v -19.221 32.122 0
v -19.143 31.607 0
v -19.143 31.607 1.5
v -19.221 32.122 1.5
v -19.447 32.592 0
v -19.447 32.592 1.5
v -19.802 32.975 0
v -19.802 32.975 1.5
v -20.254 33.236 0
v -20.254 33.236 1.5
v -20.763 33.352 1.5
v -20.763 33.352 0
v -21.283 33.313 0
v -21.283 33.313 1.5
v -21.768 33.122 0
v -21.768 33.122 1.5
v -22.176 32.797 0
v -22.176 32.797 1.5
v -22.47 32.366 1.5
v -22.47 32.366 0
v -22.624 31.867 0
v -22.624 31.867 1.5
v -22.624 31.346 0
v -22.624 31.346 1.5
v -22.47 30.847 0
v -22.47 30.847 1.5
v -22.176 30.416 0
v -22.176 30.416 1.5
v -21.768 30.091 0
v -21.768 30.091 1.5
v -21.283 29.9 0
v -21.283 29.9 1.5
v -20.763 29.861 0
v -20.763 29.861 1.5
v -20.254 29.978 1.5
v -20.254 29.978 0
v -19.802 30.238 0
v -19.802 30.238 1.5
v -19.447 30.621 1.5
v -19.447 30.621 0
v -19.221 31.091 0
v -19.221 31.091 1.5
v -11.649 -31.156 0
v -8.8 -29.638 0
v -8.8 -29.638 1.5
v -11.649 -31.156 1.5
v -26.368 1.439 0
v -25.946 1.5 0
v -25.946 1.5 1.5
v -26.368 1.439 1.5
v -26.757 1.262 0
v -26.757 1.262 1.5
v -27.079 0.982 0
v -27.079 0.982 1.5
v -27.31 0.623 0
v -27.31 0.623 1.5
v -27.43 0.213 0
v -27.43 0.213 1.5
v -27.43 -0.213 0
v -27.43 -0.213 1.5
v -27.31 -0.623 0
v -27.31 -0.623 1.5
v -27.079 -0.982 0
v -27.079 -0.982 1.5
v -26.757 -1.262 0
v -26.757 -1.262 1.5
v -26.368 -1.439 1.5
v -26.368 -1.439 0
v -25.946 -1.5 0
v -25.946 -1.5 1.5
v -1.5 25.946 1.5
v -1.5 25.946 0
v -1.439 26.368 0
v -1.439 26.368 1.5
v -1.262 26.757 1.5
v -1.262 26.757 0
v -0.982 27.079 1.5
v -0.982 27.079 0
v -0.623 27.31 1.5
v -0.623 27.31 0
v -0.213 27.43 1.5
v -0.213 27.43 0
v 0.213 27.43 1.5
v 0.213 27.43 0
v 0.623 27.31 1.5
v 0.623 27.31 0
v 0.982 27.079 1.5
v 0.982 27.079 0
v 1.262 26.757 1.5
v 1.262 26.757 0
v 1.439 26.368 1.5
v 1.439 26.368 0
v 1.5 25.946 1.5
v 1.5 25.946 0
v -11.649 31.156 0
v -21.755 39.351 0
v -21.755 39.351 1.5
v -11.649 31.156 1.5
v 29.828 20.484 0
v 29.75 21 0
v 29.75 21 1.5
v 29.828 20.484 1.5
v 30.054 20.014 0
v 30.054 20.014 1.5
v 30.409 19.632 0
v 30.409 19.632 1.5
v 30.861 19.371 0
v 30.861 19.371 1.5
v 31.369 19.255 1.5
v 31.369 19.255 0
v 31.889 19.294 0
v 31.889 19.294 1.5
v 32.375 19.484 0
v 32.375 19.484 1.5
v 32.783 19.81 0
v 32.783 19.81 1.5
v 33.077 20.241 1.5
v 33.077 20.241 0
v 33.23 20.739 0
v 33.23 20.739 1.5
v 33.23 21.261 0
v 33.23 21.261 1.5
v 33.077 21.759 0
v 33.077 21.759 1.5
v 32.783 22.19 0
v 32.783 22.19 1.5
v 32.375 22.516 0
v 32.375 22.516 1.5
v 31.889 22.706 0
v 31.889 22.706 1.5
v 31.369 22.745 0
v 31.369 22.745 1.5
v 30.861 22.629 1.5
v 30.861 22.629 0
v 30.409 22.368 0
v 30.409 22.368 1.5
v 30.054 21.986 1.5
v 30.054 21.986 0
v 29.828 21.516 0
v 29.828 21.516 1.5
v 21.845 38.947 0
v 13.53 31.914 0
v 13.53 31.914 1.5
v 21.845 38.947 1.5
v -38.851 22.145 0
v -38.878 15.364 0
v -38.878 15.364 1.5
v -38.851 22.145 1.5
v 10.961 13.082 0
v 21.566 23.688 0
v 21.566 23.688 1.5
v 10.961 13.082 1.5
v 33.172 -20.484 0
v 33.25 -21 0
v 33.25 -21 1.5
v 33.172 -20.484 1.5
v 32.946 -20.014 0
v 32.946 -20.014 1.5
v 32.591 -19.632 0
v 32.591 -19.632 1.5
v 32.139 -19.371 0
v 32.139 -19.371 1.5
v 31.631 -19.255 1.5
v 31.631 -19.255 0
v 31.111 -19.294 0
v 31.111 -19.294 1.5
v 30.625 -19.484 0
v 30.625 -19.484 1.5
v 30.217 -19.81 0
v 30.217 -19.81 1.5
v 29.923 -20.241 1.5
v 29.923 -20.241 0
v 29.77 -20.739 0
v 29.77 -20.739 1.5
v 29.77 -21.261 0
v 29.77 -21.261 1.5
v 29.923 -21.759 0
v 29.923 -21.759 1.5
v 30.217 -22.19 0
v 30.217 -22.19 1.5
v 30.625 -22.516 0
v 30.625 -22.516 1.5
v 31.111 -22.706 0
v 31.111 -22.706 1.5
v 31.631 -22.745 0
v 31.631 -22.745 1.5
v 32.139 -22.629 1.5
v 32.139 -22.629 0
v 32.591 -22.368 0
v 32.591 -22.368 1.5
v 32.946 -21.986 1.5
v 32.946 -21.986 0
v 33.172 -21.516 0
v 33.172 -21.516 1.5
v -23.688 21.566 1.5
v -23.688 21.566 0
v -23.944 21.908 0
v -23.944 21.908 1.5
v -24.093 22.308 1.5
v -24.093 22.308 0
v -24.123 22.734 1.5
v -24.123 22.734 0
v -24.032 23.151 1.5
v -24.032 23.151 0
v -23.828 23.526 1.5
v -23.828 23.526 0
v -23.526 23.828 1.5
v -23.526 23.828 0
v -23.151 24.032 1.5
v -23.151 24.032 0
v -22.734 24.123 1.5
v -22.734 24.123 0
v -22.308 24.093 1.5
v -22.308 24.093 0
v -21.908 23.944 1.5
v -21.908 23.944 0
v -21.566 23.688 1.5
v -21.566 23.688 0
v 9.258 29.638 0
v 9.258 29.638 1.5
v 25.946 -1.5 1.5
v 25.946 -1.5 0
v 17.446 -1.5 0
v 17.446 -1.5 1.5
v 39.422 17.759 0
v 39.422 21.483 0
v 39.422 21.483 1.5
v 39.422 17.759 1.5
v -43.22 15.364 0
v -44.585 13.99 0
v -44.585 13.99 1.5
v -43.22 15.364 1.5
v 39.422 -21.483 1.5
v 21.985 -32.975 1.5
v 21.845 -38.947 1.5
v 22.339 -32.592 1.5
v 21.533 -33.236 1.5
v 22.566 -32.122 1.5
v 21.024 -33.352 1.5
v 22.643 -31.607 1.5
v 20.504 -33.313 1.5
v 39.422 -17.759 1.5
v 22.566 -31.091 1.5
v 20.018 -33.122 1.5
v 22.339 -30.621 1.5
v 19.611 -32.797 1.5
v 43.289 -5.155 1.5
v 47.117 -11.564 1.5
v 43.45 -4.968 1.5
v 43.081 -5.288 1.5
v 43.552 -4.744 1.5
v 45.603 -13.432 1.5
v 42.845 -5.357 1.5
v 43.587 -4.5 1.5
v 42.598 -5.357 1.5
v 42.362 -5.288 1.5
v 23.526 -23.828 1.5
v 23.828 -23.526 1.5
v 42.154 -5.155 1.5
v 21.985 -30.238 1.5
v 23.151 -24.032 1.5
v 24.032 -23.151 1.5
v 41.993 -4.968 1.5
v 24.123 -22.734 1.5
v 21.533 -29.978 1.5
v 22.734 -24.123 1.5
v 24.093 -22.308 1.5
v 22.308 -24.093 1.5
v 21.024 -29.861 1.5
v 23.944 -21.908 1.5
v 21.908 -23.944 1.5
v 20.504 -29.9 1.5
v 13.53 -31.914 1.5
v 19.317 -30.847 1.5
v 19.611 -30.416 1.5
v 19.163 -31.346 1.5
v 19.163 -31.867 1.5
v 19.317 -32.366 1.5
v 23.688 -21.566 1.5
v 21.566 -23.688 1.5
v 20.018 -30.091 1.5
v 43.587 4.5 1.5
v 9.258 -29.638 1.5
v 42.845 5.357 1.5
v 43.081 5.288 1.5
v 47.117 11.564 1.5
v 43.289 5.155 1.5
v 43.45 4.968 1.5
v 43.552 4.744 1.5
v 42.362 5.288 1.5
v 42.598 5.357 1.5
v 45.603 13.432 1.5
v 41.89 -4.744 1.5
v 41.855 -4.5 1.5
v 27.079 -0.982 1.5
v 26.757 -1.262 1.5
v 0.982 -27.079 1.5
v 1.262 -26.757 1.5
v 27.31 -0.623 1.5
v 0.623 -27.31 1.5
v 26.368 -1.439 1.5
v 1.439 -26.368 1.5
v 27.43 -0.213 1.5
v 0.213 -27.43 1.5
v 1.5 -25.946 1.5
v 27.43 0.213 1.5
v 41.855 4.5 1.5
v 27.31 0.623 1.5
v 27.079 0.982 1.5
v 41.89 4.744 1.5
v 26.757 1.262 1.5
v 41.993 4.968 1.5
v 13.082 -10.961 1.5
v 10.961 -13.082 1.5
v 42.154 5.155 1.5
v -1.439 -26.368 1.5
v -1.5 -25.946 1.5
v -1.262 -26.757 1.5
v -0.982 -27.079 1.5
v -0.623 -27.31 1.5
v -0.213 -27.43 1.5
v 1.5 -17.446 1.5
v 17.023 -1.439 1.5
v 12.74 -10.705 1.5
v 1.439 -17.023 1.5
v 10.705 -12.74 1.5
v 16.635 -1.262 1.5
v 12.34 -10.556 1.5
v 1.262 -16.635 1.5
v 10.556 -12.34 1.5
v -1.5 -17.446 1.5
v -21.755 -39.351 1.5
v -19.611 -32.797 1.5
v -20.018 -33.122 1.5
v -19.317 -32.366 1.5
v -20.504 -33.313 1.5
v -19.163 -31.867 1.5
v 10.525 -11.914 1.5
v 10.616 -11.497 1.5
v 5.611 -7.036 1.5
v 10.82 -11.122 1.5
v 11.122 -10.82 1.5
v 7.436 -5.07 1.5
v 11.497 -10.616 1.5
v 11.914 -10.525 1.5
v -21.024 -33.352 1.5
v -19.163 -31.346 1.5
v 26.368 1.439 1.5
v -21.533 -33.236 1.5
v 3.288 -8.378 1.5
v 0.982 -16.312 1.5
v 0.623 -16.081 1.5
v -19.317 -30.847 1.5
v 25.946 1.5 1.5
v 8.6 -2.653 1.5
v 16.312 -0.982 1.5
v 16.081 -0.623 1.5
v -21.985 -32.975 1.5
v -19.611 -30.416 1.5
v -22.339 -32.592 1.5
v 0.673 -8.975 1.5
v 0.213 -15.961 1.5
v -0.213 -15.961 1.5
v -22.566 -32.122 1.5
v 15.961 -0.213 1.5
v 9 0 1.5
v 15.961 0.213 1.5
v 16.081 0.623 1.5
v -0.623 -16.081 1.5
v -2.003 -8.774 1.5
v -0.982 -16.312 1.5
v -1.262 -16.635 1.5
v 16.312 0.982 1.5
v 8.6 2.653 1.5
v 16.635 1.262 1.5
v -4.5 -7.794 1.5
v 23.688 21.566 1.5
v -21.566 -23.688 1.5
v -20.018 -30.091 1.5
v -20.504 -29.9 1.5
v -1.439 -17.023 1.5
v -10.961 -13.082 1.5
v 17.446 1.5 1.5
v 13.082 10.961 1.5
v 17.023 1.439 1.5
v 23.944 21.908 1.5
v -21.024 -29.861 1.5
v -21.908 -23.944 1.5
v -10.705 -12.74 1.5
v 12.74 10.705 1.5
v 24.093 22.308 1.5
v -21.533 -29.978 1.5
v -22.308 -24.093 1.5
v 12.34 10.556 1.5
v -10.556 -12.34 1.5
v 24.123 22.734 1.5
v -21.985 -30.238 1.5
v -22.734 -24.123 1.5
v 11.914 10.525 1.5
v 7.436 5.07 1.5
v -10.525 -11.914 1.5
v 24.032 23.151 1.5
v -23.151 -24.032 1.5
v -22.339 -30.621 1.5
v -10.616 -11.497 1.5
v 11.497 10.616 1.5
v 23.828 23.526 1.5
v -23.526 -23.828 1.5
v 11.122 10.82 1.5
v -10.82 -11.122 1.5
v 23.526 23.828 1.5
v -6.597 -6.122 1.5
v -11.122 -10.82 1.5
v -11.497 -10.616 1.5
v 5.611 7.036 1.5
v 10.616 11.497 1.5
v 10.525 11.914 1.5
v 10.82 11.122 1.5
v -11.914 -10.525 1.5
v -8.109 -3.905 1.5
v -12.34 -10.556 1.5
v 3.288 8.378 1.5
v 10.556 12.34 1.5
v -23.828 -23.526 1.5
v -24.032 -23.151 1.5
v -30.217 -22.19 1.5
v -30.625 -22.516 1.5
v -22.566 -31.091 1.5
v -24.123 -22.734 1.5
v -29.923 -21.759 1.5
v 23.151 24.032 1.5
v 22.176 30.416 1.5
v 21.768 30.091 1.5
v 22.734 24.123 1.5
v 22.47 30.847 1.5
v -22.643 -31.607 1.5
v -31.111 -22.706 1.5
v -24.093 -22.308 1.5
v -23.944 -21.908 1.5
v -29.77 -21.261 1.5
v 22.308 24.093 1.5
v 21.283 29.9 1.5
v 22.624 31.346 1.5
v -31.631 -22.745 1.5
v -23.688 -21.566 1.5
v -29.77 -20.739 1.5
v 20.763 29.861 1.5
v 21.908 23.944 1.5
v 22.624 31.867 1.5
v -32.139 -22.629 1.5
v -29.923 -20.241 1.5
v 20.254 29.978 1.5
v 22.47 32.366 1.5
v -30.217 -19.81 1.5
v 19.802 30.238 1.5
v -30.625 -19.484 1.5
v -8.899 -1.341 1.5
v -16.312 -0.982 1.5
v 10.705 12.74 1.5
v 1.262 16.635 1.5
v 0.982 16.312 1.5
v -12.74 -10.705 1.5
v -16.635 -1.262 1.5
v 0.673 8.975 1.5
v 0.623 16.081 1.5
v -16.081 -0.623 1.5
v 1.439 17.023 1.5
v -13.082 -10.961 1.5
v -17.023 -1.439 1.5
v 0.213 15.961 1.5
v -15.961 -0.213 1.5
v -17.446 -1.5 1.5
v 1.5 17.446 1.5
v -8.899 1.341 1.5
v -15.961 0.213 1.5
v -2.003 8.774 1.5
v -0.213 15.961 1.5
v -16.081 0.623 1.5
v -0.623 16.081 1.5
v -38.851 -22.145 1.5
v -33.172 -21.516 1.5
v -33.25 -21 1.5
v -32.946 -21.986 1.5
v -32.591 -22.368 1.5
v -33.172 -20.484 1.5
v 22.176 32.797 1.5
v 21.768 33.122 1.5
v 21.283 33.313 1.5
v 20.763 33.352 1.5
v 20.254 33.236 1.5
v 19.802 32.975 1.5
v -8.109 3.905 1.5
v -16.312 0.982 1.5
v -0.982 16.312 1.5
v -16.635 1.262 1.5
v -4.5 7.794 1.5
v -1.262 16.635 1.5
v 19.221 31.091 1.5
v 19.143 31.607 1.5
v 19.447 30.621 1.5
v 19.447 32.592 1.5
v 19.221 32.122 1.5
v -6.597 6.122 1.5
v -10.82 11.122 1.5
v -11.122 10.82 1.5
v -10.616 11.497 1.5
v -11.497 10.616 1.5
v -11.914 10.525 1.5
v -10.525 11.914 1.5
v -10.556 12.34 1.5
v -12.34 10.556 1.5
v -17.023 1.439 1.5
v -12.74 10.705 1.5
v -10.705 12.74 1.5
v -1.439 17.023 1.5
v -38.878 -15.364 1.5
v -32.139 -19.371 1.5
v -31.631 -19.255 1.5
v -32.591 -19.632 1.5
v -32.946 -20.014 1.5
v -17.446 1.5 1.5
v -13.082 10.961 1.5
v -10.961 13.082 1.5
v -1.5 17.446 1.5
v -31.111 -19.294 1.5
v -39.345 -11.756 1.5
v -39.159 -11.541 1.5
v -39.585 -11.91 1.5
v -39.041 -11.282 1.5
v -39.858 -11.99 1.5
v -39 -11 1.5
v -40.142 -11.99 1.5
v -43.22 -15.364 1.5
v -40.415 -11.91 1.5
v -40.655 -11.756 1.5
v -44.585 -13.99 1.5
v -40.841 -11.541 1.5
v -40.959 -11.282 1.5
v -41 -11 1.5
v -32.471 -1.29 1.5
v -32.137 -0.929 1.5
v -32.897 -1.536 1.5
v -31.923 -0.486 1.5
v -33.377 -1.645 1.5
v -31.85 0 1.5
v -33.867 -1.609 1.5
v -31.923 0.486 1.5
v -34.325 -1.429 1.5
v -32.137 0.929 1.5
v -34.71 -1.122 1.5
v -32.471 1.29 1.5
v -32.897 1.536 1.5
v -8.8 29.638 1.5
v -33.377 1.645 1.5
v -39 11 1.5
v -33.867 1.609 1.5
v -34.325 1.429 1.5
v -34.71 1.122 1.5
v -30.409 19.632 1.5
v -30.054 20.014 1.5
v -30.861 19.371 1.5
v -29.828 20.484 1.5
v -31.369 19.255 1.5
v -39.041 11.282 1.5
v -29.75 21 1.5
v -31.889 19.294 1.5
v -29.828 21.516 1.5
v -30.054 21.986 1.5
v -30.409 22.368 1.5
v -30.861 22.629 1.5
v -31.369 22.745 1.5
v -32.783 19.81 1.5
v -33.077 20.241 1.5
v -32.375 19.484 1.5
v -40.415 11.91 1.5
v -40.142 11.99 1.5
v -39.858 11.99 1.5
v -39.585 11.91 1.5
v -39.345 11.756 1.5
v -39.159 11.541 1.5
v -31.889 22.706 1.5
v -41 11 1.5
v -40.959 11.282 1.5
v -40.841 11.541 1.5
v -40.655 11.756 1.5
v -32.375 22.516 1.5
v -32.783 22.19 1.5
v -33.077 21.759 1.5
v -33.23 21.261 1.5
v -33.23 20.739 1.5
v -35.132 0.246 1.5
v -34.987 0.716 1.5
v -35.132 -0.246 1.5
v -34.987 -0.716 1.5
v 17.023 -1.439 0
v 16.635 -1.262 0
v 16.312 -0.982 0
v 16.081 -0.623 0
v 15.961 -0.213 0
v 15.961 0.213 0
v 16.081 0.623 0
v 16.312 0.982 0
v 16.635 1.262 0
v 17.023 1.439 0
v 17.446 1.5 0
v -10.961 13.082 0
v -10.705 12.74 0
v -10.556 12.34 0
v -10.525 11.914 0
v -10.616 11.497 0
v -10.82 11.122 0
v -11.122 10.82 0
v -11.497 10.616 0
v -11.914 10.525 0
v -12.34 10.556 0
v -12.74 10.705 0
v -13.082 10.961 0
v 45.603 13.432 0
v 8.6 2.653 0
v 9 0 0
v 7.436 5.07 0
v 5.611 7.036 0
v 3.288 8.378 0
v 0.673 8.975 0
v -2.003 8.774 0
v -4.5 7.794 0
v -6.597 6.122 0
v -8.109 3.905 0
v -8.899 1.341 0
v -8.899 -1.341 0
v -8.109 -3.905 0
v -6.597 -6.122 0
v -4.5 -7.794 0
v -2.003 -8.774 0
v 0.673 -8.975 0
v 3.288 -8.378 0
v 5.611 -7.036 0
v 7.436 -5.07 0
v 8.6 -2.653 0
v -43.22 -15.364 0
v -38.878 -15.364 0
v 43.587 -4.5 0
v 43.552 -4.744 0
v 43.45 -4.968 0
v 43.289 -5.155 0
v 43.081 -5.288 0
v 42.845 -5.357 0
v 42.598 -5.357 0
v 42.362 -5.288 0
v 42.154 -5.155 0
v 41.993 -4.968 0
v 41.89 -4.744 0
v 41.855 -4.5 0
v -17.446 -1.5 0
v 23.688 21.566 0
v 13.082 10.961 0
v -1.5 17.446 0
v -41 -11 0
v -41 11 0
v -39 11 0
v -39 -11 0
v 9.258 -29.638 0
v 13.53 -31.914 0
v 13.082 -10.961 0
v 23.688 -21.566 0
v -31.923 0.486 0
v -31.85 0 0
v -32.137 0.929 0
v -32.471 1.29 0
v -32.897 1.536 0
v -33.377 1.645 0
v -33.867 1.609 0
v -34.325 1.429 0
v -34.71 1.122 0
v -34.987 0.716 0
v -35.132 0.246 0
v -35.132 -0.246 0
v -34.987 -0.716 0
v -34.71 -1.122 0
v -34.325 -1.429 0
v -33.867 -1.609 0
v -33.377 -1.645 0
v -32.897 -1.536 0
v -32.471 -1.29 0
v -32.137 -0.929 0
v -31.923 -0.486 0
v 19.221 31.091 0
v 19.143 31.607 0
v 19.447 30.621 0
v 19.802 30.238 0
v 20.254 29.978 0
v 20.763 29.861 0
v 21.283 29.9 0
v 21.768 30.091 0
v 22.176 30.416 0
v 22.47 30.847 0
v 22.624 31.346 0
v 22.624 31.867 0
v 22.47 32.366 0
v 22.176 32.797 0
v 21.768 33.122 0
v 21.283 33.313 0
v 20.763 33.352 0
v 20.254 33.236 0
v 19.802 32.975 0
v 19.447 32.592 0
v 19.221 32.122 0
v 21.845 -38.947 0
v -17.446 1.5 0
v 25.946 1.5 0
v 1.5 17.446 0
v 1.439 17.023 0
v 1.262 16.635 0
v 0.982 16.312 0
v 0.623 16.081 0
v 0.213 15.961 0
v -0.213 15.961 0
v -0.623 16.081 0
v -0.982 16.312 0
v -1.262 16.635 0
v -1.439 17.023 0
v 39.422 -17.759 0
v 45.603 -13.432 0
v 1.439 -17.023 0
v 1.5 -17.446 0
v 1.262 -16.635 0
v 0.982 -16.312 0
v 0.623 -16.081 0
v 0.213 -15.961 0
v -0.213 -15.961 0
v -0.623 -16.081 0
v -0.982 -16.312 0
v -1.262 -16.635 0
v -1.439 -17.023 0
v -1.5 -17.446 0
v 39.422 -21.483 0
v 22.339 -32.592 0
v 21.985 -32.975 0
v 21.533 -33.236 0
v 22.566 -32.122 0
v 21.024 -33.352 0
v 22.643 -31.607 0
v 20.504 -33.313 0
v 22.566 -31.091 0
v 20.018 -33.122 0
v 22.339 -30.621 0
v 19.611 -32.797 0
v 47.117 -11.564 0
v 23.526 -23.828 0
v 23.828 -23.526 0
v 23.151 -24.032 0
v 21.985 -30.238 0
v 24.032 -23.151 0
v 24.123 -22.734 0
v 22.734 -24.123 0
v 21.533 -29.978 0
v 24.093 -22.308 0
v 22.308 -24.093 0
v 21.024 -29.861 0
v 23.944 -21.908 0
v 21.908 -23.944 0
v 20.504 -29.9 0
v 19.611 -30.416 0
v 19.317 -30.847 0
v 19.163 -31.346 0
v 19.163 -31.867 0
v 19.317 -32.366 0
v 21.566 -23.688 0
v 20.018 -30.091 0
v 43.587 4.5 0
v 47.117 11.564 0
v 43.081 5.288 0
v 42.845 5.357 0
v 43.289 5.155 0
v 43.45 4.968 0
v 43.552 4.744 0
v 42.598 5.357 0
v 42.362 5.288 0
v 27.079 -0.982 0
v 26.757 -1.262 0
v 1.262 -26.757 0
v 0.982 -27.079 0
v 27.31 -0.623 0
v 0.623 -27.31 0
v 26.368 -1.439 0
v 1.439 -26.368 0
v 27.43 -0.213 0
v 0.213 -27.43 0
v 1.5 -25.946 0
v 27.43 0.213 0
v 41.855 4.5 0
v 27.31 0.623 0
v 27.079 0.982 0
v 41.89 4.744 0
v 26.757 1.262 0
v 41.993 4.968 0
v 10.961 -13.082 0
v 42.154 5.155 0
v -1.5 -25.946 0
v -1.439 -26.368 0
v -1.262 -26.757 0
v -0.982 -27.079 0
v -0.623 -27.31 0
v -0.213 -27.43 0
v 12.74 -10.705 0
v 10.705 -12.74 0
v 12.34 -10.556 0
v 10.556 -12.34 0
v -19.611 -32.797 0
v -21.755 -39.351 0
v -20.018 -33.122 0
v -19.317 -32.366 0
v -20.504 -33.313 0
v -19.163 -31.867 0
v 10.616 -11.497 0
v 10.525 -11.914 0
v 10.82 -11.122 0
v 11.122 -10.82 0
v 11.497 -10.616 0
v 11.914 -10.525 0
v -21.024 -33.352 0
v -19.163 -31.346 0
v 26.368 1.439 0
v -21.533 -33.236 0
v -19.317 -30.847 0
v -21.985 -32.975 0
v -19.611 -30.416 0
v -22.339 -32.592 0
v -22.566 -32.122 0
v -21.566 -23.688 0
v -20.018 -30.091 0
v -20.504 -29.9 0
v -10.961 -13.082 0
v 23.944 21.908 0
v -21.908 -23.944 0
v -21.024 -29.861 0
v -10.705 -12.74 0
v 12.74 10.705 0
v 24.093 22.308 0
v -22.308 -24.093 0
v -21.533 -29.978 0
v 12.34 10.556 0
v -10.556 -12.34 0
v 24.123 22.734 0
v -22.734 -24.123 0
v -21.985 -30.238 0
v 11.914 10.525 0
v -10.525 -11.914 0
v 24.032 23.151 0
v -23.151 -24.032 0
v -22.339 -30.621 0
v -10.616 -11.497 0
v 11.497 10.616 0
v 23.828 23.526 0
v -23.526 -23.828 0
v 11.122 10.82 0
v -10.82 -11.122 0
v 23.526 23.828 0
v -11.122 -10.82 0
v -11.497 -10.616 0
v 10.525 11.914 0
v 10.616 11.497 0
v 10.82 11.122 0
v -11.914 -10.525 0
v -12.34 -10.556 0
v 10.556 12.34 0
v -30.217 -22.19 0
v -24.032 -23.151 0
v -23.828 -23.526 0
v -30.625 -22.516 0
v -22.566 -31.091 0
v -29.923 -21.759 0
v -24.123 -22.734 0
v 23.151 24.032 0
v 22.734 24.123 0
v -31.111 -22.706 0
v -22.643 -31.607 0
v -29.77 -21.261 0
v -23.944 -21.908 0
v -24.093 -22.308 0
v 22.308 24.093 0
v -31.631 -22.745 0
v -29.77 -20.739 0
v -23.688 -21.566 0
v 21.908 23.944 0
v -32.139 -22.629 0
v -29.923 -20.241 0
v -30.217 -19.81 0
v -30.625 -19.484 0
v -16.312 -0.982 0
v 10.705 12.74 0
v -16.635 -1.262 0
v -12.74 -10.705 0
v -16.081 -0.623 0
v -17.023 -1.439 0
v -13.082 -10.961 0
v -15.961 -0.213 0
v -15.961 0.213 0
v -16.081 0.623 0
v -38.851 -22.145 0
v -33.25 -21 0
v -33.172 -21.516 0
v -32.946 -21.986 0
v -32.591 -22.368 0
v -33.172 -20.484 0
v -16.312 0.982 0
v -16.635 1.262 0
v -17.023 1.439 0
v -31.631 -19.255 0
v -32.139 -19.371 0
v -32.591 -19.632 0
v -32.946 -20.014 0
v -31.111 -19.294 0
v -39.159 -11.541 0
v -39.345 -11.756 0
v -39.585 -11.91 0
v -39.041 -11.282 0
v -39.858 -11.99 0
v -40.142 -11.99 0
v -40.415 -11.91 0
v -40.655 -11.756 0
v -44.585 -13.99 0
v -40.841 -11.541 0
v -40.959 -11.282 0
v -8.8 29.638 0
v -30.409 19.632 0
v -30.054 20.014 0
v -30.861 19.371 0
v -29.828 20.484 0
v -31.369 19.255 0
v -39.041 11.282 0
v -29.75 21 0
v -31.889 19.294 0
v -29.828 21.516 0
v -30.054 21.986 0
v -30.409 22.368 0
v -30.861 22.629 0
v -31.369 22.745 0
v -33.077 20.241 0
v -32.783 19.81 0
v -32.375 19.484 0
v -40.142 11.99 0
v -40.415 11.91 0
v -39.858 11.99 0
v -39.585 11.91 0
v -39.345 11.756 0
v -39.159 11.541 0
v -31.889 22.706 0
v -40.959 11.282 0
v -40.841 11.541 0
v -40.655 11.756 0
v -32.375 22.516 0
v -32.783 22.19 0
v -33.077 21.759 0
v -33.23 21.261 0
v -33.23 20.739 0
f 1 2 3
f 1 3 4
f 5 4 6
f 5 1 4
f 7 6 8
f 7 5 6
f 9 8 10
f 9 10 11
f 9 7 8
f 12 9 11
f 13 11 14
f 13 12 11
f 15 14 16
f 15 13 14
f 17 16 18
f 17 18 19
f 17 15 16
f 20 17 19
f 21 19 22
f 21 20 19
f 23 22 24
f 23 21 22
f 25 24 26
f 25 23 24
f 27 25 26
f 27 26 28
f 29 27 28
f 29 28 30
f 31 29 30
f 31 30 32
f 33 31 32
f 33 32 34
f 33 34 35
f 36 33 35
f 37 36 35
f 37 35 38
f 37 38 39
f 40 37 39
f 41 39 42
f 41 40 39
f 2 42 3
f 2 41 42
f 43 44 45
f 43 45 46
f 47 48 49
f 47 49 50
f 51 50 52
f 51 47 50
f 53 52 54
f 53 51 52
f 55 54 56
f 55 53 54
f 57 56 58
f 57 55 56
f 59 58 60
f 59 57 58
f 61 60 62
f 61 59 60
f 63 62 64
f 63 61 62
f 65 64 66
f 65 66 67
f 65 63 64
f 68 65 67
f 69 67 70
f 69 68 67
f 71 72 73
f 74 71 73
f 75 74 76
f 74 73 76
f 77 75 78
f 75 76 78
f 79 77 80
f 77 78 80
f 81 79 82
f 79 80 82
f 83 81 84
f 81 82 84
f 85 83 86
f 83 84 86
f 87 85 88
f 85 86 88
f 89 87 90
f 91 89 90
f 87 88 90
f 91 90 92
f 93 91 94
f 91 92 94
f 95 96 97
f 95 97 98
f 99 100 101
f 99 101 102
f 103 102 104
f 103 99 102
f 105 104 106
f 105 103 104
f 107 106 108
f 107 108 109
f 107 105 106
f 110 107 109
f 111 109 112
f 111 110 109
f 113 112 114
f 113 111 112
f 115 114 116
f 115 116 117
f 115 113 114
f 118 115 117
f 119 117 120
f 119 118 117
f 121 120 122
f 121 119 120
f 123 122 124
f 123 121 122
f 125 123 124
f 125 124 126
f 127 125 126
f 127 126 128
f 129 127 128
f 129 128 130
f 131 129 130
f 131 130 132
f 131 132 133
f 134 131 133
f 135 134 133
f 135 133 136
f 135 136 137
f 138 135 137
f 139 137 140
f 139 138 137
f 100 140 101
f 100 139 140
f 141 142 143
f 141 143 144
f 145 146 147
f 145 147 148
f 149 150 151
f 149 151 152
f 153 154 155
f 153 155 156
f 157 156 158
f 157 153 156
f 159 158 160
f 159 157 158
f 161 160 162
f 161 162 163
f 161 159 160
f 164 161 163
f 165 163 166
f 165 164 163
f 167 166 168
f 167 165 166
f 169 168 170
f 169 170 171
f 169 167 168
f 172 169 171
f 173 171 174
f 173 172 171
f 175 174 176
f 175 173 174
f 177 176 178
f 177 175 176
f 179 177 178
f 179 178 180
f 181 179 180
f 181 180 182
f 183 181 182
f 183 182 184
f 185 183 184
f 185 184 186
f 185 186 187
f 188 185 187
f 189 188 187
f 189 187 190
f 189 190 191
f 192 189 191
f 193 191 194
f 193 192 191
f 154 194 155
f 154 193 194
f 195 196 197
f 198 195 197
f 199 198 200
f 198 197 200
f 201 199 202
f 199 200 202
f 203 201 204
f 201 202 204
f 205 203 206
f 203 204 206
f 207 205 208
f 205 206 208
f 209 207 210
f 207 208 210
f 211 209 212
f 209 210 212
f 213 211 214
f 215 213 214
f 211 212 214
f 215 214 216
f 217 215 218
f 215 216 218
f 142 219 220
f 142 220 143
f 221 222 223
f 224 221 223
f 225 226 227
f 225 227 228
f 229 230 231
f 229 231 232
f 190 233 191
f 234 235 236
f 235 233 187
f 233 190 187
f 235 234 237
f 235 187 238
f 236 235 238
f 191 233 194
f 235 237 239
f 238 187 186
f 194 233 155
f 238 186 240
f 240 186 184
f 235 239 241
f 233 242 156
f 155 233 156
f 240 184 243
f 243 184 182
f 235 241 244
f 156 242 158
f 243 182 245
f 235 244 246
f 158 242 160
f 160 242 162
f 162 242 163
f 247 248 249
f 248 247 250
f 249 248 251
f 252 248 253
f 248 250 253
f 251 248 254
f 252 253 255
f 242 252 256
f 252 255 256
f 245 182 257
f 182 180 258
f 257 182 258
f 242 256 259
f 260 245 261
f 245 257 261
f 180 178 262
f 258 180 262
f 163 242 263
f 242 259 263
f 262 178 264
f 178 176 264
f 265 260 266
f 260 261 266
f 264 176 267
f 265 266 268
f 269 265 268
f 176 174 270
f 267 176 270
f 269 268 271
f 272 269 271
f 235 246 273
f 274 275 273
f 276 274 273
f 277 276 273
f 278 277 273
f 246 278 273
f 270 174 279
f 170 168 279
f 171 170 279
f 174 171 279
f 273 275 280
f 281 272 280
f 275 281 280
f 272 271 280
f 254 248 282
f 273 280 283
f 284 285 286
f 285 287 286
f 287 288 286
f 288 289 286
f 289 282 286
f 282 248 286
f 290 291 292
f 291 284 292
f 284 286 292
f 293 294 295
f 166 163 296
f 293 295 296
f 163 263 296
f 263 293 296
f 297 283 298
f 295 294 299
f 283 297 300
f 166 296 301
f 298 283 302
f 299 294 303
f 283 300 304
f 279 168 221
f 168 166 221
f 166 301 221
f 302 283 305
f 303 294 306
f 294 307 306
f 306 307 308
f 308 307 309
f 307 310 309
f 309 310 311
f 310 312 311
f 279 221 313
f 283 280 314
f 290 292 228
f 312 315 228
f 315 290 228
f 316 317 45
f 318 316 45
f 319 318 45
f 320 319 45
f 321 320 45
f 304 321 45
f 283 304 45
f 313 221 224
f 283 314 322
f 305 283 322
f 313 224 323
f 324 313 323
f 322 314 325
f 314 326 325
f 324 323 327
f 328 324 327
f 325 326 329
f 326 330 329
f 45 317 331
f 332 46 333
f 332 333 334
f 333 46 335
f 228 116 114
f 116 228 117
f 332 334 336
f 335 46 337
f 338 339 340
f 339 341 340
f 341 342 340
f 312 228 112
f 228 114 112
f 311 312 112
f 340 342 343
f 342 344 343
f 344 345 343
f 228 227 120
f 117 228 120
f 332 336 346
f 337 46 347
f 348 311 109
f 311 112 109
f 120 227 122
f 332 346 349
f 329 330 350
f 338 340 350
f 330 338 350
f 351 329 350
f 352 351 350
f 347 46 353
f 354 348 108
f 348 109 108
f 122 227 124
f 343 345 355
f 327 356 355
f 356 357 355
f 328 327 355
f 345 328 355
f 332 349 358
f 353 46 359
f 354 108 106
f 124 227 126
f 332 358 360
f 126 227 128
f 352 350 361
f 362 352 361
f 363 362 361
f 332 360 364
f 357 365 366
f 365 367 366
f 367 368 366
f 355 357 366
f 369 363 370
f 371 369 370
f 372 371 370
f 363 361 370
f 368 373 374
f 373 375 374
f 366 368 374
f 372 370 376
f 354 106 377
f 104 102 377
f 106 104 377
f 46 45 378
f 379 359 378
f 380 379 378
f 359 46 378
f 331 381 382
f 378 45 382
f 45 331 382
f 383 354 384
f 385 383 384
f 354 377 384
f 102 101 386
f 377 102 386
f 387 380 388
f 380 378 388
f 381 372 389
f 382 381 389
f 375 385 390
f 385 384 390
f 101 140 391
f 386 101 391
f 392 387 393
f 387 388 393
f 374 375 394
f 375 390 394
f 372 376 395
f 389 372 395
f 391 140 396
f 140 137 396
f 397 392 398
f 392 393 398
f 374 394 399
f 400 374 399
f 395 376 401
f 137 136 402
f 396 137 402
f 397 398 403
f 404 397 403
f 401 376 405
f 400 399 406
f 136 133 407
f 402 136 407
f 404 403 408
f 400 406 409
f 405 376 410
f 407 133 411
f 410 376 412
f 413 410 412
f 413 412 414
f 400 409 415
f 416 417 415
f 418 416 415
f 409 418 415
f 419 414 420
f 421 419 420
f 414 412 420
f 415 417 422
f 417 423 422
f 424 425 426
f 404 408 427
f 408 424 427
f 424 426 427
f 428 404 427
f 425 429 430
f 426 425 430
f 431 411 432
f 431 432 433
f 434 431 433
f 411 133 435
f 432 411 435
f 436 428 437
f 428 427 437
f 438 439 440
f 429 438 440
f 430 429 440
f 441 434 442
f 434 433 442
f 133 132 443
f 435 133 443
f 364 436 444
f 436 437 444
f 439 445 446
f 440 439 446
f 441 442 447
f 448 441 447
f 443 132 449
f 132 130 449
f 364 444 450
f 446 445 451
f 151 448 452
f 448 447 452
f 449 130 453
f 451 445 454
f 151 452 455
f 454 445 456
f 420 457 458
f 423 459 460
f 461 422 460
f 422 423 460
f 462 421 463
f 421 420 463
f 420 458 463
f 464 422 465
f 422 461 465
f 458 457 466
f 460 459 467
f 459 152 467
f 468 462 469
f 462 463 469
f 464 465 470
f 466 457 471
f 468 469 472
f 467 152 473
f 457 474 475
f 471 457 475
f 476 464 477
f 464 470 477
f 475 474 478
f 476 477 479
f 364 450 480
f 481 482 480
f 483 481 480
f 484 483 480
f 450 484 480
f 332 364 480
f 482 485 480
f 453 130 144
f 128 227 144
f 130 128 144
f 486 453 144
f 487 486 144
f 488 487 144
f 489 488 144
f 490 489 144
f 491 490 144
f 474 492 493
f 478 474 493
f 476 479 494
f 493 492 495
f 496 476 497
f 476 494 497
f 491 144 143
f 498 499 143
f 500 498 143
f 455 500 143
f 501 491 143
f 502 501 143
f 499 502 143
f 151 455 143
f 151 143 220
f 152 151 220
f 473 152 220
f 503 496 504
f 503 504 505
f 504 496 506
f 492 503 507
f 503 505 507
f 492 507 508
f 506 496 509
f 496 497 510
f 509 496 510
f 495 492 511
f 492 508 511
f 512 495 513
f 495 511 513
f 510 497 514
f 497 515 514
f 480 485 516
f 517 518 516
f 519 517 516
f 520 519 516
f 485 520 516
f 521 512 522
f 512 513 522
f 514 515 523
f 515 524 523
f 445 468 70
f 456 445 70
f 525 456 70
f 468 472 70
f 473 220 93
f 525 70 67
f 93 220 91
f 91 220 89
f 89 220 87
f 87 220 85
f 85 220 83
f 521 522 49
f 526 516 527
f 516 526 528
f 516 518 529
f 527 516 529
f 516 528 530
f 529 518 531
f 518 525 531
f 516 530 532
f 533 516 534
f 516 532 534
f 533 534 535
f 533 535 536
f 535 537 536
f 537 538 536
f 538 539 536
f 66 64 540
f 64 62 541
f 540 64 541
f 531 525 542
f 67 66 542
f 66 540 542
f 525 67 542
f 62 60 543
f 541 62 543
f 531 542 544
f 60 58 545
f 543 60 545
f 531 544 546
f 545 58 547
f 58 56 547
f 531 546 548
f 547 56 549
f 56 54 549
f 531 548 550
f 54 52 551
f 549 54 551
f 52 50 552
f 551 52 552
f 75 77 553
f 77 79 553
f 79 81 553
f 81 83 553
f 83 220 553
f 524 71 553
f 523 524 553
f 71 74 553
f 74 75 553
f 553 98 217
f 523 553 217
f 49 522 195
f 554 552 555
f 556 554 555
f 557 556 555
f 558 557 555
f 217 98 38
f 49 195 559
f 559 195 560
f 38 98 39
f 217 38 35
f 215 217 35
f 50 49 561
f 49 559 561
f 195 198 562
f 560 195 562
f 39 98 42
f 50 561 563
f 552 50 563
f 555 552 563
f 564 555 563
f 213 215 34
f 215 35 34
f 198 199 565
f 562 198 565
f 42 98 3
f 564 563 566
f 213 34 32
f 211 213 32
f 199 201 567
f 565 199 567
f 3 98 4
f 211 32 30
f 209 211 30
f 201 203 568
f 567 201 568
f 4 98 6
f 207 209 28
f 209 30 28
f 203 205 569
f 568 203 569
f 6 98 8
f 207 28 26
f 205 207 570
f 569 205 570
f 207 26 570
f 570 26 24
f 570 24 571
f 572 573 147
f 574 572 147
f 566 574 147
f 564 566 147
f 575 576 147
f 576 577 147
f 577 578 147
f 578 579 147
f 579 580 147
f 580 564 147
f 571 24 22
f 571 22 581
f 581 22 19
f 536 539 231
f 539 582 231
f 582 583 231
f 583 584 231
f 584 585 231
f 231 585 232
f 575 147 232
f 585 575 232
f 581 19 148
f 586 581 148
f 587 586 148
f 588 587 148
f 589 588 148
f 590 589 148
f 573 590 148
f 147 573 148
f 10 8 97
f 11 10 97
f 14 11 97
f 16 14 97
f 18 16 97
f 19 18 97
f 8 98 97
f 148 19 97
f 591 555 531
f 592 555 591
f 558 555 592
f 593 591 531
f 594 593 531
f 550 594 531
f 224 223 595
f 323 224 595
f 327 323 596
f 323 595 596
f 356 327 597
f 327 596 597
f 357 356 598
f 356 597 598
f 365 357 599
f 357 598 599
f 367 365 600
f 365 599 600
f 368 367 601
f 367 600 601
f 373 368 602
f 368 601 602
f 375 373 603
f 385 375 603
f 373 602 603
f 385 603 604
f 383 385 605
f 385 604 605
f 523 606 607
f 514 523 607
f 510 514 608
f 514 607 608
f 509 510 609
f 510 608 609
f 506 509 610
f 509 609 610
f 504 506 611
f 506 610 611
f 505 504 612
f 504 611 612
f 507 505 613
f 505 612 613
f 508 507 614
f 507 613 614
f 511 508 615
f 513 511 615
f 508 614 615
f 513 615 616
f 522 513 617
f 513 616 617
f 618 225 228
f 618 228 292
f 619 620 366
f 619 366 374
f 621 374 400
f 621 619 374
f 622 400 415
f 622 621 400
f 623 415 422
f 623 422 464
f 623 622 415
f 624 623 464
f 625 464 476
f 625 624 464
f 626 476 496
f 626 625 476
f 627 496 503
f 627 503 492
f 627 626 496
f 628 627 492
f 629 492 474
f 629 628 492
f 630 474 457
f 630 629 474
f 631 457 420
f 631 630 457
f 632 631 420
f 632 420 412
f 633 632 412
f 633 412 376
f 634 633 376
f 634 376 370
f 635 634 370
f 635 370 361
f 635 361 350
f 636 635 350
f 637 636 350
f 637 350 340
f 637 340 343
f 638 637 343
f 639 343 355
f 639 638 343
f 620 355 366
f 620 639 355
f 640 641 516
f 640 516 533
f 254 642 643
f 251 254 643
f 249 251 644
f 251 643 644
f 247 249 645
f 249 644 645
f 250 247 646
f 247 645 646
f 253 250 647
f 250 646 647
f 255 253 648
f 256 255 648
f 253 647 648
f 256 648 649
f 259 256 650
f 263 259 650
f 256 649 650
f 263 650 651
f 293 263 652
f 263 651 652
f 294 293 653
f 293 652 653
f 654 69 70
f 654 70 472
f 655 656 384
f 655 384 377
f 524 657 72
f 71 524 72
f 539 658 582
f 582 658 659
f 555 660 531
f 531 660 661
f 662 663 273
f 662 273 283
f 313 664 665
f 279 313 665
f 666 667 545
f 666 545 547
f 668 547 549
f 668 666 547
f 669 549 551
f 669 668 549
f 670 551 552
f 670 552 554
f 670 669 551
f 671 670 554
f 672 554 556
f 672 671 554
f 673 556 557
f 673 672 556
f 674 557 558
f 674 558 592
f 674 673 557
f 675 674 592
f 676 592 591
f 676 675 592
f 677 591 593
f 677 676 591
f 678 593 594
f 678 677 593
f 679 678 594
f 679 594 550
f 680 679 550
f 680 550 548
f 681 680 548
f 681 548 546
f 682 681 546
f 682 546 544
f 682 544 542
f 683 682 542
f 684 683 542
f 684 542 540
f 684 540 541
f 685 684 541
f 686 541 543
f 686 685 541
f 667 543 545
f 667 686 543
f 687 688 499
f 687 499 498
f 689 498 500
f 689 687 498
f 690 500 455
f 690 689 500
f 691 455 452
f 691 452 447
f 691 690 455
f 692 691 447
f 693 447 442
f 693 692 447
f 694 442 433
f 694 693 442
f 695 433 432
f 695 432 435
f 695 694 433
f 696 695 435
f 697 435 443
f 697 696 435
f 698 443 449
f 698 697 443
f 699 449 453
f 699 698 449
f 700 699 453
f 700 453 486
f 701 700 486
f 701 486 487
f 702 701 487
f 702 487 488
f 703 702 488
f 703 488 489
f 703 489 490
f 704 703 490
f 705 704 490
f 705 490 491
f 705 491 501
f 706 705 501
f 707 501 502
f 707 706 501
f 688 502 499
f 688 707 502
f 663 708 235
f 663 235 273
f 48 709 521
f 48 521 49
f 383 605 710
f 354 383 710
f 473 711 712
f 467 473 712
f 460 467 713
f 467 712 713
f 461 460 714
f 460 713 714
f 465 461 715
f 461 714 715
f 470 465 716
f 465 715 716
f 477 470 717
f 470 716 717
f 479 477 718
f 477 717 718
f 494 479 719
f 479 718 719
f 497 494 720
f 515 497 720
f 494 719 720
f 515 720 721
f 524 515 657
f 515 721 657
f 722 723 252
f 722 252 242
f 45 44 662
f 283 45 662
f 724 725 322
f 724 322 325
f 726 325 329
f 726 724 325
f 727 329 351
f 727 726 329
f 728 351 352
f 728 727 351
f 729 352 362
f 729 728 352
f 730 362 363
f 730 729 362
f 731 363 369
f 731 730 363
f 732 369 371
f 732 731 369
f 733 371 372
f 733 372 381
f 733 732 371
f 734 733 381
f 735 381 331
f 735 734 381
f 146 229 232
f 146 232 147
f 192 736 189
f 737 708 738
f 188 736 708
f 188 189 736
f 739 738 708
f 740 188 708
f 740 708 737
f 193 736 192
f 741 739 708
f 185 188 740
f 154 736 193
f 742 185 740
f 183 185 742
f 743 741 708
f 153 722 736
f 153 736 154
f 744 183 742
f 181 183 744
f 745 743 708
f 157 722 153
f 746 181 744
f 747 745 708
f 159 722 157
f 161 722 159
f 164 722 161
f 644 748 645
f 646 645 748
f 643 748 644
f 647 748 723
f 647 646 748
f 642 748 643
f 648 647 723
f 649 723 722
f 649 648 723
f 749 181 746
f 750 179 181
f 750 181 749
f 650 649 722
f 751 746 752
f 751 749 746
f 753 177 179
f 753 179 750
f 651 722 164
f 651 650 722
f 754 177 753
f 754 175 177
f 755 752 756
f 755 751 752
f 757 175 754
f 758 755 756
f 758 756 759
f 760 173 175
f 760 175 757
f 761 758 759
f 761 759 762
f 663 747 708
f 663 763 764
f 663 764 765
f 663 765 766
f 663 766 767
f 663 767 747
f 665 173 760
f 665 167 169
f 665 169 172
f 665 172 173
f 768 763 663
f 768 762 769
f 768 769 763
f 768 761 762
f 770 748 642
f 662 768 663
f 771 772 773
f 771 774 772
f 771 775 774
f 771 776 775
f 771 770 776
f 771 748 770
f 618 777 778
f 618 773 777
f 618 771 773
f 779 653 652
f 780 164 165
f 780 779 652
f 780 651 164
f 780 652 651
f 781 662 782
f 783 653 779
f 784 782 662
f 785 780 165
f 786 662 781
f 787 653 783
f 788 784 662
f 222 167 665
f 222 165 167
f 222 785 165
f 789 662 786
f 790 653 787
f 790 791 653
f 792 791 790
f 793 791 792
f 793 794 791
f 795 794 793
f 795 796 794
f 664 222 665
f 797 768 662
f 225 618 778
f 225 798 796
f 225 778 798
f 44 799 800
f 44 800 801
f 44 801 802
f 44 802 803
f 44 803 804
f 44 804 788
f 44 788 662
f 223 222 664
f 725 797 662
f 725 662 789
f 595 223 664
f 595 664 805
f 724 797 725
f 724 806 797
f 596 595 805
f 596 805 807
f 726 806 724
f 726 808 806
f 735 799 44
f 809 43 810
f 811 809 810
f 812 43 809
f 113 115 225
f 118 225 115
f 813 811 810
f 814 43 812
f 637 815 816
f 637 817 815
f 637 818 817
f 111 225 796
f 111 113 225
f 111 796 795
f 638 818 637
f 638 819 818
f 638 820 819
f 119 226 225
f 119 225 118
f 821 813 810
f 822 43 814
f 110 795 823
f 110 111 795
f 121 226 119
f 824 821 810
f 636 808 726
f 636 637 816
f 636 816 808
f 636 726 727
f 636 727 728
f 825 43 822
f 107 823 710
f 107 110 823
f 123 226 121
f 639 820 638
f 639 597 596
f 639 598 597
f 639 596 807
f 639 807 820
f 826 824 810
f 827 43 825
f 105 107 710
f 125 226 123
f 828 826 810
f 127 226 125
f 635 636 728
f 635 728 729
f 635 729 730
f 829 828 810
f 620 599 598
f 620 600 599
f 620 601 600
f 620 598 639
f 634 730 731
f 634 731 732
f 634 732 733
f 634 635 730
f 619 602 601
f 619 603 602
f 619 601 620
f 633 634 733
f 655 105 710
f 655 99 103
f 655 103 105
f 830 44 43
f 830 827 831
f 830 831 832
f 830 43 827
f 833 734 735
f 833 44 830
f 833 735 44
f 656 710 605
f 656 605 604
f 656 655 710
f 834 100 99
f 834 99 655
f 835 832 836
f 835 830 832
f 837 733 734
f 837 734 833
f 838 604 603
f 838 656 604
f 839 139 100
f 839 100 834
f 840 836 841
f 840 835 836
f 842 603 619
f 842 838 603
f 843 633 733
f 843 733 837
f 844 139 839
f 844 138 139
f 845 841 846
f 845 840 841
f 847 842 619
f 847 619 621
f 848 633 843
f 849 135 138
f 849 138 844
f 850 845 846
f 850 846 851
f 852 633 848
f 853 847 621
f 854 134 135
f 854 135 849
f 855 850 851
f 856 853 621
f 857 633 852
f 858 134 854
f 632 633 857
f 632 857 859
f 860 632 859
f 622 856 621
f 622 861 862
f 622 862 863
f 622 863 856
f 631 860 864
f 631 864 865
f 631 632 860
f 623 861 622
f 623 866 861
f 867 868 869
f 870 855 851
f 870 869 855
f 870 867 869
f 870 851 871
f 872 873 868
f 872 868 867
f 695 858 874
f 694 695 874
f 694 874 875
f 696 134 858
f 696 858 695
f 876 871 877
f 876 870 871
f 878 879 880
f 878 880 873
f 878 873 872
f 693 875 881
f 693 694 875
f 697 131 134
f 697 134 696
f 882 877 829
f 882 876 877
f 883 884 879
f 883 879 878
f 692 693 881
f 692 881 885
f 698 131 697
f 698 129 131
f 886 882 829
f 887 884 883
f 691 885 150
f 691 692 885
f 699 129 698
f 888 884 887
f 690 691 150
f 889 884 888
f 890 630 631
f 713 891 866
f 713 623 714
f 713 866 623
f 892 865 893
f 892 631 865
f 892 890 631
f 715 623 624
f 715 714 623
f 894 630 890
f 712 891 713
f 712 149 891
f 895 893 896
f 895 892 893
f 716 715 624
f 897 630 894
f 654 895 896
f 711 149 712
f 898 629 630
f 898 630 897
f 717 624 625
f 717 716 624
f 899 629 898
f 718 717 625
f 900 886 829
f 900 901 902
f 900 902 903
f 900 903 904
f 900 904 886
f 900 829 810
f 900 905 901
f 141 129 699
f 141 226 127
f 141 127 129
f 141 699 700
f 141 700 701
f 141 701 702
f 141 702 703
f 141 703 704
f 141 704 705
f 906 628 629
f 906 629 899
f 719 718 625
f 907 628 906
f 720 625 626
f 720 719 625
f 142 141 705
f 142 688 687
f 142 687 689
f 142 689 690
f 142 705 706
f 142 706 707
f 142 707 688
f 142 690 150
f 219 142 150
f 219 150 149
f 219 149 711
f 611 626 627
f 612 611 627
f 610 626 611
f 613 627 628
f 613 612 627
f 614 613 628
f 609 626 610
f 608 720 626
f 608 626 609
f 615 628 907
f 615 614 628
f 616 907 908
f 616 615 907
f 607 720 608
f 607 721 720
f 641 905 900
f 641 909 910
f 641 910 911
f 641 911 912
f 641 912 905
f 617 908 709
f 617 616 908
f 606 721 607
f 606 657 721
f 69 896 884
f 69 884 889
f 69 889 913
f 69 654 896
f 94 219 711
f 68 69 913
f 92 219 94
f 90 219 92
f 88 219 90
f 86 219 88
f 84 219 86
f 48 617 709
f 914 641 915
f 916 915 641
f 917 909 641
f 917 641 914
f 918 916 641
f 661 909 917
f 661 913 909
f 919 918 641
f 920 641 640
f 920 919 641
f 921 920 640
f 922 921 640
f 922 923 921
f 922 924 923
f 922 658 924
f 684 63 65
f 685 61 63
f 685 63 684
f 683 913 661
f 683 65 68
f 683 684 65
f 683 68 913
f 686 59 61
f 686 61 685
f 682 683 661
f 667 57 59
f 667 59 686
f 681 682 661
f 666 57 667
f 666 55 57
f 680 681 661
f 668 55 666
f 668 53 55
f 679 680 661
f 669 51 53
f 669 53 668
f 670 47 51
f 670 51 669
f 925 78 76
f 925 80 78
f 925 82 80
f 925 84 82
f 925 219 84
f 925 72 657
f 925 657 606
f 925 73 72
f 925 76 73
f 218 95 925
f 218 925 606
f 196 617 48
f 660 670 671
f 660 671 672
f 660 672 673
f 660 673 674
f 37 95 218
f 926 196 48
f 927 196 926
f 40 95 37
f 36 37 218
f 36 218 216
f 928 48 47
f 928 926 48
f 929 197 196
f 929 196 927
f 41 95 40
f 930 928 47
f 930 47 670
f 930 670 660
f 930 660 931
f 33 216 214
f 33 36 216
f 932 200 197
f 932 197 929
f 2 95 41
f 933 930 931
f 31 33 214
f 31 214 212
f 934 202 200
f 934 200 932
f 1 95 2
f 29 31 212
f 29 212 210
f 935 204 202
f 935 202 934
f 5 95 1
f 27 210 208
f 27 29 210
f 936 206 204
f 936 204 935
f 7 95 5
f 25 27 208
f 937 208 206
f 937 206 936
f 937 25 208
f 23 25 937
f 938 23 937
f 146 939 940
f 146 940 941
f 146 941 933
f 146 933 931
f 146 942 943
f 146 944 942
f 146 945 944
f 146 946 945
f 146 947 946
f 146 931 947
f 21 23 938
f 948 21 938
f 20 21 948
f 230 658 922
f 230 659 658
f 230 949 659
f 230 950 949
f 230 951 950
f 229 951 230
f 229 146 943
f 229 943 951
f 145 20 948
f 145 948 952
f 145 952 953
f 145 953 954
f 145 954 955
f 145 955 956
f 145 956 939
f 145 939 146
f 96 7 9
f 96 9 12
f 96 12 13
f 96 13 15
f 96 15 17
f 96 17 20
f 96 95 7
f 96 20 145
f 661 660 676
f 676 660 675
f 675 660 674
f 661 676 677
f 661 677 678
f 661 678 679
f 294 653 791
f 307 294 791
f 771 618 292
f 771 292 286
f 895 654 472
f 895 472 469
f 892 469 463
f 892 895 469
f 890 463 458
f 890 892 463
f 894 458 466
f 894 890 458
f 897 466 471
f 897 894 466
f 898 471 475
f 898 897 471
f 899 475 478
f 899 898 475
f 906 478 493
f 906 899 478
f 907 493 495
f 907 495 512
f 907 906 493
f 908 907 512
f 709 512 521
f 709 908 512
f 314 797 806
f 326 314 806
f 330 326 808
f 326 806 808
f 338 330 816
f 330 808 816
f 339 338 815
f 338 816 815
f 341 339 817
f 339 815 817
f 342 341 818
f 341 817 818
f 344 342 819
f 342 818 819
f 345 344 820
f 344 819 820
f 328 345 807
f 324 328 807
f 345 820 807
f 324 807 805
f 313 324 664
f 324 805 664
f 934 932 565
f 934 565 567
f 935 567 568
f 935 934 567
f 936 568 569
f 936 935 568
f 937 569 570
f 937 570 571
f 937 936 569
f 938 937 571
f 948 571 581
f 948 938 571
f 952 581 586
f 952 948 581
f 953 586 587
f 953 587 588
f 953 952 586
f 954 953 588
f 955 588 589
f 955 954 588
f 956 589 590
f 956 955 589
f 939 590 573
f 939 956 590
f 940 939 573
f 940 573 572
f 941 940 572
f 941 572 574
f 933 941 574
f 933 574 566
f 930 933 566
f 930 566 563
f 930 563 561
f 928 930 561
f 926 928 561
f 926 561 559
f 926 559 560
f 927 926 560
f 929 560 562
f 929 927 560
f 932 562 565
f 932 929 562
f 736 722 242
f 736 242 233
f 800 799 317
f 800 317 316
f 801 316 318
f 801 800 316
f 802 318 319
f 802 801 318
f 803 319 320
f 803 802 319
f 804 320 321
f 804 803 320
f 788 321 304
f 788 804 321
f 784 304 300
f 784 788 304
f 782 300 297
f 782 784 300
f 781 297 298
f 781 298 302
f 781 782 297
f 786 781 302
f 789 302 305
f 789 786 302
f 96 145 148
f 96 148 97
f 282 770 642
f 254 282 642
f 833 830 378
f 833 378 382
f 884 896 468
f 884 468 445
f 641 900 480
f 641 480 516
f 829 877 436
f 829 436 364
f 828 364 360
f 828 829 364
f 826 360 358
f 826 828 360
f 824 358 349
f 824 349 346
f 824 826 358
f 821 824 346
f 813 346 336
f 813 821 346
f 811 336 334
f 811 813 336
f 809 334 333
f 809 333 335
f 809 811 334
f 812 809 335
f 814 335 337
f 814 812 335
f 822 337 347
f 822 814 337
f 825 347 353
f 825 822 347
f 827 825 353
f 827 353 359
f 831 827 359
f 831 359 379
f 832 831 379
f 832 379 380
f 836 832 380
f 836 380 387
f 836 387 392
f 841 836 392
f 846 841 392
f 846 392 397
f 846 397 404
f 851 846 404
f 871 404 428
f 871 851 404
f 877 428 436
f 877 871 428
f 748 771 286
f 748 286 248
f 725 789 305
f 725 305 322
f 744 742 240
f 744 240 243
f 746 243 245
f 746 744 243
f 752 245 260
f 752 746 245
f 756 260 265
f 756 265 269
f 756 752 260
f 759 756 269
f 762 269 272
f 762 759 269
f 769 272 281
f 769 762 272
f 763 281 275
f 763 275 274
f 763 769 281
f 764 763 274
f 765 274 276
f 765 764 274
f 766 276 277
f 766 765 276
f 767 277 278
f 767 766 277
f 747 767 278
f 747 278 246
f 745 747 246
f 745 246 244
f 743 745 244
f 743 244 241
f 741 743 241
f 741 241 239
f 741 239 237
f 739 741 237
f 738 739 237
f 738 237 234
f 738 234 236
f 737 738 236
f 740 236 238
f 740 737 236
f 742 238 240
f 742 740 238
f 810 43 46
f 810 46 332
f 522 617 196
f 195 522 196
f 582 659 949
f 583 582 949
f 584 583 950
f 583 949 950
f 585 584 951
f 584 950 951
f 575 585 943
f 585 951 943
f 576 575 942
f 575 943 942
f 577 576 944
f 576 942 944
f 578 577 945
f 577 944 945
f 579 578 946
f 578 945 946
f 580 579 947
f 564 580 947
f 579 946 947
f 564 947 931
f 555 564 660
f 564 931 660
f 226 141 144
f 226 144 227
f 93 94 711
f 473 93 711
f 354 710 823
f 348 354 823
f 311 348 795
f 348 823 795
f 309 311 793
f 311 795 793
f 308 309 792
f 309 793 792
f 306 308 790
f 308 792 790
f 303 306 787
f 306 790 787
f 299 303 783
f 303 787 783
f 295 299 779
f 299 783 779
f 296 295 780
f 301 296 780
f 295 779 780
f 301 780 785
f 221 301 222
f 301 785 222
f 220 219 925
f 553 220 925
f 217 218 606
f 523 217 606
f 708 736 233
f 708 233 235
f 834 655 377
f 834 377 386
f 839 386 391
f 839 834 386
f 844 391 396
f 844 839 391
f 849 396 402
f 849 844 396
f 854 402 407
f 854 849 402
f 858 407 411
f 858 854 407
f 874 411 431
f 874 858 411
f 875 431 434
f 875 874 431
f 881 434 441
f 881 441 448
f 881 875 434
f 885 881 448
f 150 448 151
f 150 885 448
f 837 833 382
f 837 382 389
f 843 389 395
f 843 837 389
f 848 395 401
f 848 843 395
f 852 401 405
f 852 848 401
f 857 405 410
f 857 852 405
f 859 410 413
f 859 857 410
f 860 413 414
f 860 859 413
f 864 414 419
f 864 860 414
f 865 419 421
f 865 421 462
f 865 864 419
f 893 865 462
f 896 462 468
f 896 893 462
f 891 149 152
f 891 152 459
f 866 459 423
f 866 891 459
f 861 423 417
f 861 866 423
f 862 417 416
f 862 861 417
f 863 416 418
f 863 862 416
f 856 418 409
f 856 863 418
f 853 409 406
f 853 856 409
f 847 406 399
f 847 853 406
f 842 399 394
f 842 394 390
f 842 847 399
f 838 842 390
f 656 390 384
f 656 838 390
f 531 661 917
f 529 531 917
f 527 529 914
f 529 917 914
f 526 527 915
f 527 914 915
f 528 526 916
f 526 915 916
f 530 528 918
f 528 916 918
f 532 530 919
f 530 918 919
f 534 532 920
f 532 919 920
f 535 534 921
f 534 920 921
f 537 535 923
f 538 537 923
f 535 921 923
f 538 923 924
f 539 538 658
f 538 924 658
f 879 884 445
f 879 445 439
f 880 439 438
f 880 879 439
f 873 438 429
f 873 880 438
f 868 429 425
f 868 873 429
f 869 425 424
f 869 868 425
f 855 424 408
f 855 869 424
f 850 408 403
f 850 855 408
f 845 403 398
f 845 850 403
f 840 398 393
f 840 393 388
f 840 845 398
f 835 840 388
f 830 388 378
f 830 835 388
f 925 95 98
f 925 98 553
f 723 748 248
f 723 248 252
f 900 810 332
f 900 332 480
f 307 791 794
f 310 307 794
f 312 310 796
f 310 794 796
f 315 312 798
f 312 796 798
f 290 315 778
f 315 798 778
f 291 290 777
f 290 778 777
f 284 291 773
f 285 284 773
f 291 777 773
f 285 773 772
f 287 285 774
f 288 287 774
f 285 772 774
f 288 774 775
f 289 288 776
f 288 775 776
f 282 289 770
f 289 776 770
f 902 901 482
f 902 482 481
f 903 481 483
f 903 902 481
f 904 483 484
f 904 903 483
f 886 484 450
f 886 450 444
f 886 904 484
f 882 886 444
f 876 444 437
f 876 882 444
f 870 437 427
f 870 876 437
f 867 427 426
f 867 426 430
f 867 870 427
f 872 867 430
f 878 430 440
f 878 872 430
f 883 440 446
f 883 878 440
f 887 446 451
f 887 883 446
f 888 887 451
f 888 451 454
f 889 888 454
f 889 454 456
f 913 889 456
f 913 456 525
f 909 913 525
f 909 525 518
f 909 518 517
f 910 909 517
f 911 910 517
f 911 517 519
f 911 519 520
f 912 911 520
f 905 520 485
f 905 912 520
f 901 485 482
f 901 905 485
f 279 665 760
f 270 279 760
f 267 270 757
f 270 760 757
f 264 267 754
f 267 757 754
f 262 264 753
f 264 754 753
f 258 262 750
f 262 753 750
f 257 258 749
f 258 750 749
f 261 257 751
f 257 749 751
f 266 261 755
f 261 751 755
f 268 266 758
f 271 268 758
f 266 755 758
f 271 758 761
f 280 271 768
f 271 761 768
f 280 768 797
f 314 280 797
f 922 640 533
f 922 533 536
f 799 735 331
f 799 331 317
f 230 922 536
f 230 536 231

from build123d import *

# Parameters (mm, degrees)
UPPER_BOARD_R   = 9
UPPER_BOARD_R_2 = 1.75
UPPER_BOARD_R_3 = 1.65
EXTRUDE_1_DEPTH = 1.5


with BuildPart() as part:
    # Upper_board → 凸台-拉伸1 (new body)
    with BuildSketch(Plane.XY):
        Polygon((0, 29.63770528), (9.258229776, 29.63770528), (13.530145247, 31.914413679), (21.845237215, 38.947274579), (39.422116781, 21.483203913), (39.422116781, 17.759375685), (45.602672711, 13.431703833), (47.117107925, 11.564161962), (47.117107925, -11.564161962), (45.602672711, -13.431703833), (39.422116781, -17.759375685), (39.422116781, -21.483203913), (21.845237215, -38.947274579), (13.530145247, -31.914413679), (9.258229776, -29.63770528), (0, -29.63770528), (-8.800437365, -29.63770528), (-11.64882797, -31.155749084), (-21.754927214, -39.351031245), (-38.850540354, -22.144989251), (-38.878084859, -15.364158174), (-43.219581062, -15.364158174), (-44.585312397, -13.989604918), (-44.585312397, 13.989604918), (-43.219581062, 15.364158174), (-38.878084859, 15.364158174), (-38.850540354, 22.144989251), (-21.754927214, 39.351031245), (-11.64882797, 31.155749084), (-8.800437365, 29.63770528), align=None)
        Circle(UPPER_BOARD_R, mode=Mode.SUBTRACT)
        with Locations((-20.893398282, 31.606601718)):
            Circle(UPPER_BOARD_R_2, mode=Mode.SUBTRACT)
        with Locations((-31.5, 21)):
            Circle(UPPER_BOARD_R_2, mode=Mode.SUBTRACT)
        with Locations((-33.5, 0)):
            Circle(UPPER_BOARD_R_3, mode=Mode.SUBTRACT)
        with Locations(Location((20.893398282, 31.606601718, 0), (0, 0, 180))):
            Circle(UPPER_BOARD_R_2, mode=Mode.SUBTRACT)
        with Locations(Location((31.5, 21, 0), (0, 0, 180))):
            Circle(UPPER_BOARD_R_2, mode=Mode.SUBTRACT)
        with Locations(Location((-20.893398282, -31.606601718, 0), (0, 0, 180))):
            Circle(UPPER_BOARD_R_2, mode=Mode.SUBTRACT)
        with Locations(Location((-31.5, -21, 0), (0, 0, 180))):
            Circle(UPPER_BOARD_R_2, mode=Mode.SUBTRACT)
        with Locations((20.893398282, -31.606601718)):
            Circle(UPPER_BOARD_R_2, mode=Mode.SUBTRACT)
        with Locations((31.5, -21)):
            Circle(UPPER_BOARD_R_2, mode=Mode.SUBTRACT)
        with BuildLine():
            Line((-21.566327477, 23.687647821), (-10.960584458, 13.081904801))
            ThreePointArc((-10.960584458, 13.081904801), (-10.960584458, 10.960584458), (-13.081904801, 10.960584458))
            Line((-13.081904801, 10.960584458), (-23.687647821, 21.566327477))
            ThreePointArc((-23.687647821, 21.566327477), (-23.687647821, 23.687647821), (-21.566327477, 23.687647821))
        make_face(mode=Mode.SUBTRACT)
        with BuildLine():
            Line((-1.5, 17.445654013), (-1.5, 25.945654013))
            ThreePointArc((-1.5, 25.945654013), (0, 27.445654013), (1.5, 25.945654013))
            Line((1.5, 25.945654013), (1.5, 17.445654013))
            ThreePointArc((1.5, 17.445654013), (0, 15.945654013), (-1.5, 17.445654013))
        make_face(mode=Mode.SUBTRACT)
        with BuildLine():
            Line((-1.5, -17.445654013), (-1.5, -25.945654013))
            ThreePointArc((-1.5, -25.945654013), (0, -27.445654013), (1.5, -25.945654013))
            Line((1.5, -25.945654013), (1.5, -17.445654013))
            ThreePointArc((1.5, -17.445654013), (0, -15.945654013), (-1.5, -17.445654013))
        make_face(mode=Mode.SUBTRACT)
        with BuildLine():
            Line((-17.445654013, 1.5), (-25.945654013, 1.5))
            ThreePointArc((-25.945654013, 1.5), (-27.445654013, 0), (-25.945654013, -1.5))
            Line((-25.945654013, -1.5), (-17.445654013, -1.5))
            ThreePointArc((-17.445654013, -1.5), (-15.945654013, 0), (-17.445654013, 1.5))
        make_face(mode=Mode.SUBTRACT)
        with BuildLine():
            Line((17.445654013, 1.5), (25.945654013, 1.5))
            ThreePointArc((25.945654013, 1.5), (27.445654013, 0), (25.945654013, -1.5))
            Line((25.945654013, -1.5), (17.445654013, -1.5))
            ThreePointArc((17.445654013, -1.5), (15.945654013, 0), (17.445654013, 1.5))
        make_face(mode=Mode.SUBTRACT)
        with BuildLine():
            Line((-21.566327477, -23.687647821), (-10.960584458, -13.081904801))
            ThreePointArc((-10.960584458, -13.081904801), (-10.960584458, -10.960584458), (-13.081904801, -10.960584458))
            Line((-13.081904801, -10.960584458), (-23.687647821, -21.566327477))
            ThreePointArc((-23.687647821, -21.566327477), (-23.687647821, -23.687647821), (-21.566327477, -23.687647821))
        make_face(mode=Mode.SUBTRACT)
        with BuildLine():
            Line((21.566327477, 23.687647821), (10.960584458, 13.081904801))
            ThreePointArc((10.960584458, 13.081904801), (10.960584458, 10.960584458), (13.081904801, 10.960584458))
            Line((13.081904801, 10.960584458), (23.687647821, 21.566327477))
            ThreePointArc((23.687647821, 21.566327477), (23.687647821, 23.687647821), (21.566327477, 23.687647821))
        make_face(mode=Mode.SUBTRACT)
        with BuildLine():
            Line((21.566327477, -23.687647821), (10.960584458, -13.081904801))
            ThreePointArc((10.960584458, -13.081904801), (10.960584458, -10.960584458), (13.081904801, -10.960584458))
            Line((13.081904801, -10.960584458), (23.687647821, -21.566327477))
            ThreePointArc((23.687647821, -21.566327477), (23.687647821, -23.687647821), (21.566327477, -23.687647821))
        make_face(mode=Mode.SUBTRACT)
        with BuildLine():
            Line((-41, -11), (-41, 11))
            ThreePointArc((-41, 11), (-40, 12), (-39, 11))
            Line((-39, 11), (-39, -11))
            ThreePointArc((-39, -11), (-40, -12), (-41, -11))
        make_face(mode=Mode.SUBTRACT)
        with BuildLine():
            Line((41.855351652, -4.5), (41.855351652, 4.5))
            ThreePointArc((41.855351652, 4.5), (42.721395453, 5.366043802), (43.587439255, 4.5))
            Line((43.587439255, 4.5), (43.587439255, -4.5))
            ThreePointArc((43.587439255, -4.5), (42.721395453, -5.366043802), (41.855351652, -4.5))
        make_face(mode=Mode.SUBTRACT)
    extrude(amount=EXTRUDE_1_DEPTH)


solid = part.part
